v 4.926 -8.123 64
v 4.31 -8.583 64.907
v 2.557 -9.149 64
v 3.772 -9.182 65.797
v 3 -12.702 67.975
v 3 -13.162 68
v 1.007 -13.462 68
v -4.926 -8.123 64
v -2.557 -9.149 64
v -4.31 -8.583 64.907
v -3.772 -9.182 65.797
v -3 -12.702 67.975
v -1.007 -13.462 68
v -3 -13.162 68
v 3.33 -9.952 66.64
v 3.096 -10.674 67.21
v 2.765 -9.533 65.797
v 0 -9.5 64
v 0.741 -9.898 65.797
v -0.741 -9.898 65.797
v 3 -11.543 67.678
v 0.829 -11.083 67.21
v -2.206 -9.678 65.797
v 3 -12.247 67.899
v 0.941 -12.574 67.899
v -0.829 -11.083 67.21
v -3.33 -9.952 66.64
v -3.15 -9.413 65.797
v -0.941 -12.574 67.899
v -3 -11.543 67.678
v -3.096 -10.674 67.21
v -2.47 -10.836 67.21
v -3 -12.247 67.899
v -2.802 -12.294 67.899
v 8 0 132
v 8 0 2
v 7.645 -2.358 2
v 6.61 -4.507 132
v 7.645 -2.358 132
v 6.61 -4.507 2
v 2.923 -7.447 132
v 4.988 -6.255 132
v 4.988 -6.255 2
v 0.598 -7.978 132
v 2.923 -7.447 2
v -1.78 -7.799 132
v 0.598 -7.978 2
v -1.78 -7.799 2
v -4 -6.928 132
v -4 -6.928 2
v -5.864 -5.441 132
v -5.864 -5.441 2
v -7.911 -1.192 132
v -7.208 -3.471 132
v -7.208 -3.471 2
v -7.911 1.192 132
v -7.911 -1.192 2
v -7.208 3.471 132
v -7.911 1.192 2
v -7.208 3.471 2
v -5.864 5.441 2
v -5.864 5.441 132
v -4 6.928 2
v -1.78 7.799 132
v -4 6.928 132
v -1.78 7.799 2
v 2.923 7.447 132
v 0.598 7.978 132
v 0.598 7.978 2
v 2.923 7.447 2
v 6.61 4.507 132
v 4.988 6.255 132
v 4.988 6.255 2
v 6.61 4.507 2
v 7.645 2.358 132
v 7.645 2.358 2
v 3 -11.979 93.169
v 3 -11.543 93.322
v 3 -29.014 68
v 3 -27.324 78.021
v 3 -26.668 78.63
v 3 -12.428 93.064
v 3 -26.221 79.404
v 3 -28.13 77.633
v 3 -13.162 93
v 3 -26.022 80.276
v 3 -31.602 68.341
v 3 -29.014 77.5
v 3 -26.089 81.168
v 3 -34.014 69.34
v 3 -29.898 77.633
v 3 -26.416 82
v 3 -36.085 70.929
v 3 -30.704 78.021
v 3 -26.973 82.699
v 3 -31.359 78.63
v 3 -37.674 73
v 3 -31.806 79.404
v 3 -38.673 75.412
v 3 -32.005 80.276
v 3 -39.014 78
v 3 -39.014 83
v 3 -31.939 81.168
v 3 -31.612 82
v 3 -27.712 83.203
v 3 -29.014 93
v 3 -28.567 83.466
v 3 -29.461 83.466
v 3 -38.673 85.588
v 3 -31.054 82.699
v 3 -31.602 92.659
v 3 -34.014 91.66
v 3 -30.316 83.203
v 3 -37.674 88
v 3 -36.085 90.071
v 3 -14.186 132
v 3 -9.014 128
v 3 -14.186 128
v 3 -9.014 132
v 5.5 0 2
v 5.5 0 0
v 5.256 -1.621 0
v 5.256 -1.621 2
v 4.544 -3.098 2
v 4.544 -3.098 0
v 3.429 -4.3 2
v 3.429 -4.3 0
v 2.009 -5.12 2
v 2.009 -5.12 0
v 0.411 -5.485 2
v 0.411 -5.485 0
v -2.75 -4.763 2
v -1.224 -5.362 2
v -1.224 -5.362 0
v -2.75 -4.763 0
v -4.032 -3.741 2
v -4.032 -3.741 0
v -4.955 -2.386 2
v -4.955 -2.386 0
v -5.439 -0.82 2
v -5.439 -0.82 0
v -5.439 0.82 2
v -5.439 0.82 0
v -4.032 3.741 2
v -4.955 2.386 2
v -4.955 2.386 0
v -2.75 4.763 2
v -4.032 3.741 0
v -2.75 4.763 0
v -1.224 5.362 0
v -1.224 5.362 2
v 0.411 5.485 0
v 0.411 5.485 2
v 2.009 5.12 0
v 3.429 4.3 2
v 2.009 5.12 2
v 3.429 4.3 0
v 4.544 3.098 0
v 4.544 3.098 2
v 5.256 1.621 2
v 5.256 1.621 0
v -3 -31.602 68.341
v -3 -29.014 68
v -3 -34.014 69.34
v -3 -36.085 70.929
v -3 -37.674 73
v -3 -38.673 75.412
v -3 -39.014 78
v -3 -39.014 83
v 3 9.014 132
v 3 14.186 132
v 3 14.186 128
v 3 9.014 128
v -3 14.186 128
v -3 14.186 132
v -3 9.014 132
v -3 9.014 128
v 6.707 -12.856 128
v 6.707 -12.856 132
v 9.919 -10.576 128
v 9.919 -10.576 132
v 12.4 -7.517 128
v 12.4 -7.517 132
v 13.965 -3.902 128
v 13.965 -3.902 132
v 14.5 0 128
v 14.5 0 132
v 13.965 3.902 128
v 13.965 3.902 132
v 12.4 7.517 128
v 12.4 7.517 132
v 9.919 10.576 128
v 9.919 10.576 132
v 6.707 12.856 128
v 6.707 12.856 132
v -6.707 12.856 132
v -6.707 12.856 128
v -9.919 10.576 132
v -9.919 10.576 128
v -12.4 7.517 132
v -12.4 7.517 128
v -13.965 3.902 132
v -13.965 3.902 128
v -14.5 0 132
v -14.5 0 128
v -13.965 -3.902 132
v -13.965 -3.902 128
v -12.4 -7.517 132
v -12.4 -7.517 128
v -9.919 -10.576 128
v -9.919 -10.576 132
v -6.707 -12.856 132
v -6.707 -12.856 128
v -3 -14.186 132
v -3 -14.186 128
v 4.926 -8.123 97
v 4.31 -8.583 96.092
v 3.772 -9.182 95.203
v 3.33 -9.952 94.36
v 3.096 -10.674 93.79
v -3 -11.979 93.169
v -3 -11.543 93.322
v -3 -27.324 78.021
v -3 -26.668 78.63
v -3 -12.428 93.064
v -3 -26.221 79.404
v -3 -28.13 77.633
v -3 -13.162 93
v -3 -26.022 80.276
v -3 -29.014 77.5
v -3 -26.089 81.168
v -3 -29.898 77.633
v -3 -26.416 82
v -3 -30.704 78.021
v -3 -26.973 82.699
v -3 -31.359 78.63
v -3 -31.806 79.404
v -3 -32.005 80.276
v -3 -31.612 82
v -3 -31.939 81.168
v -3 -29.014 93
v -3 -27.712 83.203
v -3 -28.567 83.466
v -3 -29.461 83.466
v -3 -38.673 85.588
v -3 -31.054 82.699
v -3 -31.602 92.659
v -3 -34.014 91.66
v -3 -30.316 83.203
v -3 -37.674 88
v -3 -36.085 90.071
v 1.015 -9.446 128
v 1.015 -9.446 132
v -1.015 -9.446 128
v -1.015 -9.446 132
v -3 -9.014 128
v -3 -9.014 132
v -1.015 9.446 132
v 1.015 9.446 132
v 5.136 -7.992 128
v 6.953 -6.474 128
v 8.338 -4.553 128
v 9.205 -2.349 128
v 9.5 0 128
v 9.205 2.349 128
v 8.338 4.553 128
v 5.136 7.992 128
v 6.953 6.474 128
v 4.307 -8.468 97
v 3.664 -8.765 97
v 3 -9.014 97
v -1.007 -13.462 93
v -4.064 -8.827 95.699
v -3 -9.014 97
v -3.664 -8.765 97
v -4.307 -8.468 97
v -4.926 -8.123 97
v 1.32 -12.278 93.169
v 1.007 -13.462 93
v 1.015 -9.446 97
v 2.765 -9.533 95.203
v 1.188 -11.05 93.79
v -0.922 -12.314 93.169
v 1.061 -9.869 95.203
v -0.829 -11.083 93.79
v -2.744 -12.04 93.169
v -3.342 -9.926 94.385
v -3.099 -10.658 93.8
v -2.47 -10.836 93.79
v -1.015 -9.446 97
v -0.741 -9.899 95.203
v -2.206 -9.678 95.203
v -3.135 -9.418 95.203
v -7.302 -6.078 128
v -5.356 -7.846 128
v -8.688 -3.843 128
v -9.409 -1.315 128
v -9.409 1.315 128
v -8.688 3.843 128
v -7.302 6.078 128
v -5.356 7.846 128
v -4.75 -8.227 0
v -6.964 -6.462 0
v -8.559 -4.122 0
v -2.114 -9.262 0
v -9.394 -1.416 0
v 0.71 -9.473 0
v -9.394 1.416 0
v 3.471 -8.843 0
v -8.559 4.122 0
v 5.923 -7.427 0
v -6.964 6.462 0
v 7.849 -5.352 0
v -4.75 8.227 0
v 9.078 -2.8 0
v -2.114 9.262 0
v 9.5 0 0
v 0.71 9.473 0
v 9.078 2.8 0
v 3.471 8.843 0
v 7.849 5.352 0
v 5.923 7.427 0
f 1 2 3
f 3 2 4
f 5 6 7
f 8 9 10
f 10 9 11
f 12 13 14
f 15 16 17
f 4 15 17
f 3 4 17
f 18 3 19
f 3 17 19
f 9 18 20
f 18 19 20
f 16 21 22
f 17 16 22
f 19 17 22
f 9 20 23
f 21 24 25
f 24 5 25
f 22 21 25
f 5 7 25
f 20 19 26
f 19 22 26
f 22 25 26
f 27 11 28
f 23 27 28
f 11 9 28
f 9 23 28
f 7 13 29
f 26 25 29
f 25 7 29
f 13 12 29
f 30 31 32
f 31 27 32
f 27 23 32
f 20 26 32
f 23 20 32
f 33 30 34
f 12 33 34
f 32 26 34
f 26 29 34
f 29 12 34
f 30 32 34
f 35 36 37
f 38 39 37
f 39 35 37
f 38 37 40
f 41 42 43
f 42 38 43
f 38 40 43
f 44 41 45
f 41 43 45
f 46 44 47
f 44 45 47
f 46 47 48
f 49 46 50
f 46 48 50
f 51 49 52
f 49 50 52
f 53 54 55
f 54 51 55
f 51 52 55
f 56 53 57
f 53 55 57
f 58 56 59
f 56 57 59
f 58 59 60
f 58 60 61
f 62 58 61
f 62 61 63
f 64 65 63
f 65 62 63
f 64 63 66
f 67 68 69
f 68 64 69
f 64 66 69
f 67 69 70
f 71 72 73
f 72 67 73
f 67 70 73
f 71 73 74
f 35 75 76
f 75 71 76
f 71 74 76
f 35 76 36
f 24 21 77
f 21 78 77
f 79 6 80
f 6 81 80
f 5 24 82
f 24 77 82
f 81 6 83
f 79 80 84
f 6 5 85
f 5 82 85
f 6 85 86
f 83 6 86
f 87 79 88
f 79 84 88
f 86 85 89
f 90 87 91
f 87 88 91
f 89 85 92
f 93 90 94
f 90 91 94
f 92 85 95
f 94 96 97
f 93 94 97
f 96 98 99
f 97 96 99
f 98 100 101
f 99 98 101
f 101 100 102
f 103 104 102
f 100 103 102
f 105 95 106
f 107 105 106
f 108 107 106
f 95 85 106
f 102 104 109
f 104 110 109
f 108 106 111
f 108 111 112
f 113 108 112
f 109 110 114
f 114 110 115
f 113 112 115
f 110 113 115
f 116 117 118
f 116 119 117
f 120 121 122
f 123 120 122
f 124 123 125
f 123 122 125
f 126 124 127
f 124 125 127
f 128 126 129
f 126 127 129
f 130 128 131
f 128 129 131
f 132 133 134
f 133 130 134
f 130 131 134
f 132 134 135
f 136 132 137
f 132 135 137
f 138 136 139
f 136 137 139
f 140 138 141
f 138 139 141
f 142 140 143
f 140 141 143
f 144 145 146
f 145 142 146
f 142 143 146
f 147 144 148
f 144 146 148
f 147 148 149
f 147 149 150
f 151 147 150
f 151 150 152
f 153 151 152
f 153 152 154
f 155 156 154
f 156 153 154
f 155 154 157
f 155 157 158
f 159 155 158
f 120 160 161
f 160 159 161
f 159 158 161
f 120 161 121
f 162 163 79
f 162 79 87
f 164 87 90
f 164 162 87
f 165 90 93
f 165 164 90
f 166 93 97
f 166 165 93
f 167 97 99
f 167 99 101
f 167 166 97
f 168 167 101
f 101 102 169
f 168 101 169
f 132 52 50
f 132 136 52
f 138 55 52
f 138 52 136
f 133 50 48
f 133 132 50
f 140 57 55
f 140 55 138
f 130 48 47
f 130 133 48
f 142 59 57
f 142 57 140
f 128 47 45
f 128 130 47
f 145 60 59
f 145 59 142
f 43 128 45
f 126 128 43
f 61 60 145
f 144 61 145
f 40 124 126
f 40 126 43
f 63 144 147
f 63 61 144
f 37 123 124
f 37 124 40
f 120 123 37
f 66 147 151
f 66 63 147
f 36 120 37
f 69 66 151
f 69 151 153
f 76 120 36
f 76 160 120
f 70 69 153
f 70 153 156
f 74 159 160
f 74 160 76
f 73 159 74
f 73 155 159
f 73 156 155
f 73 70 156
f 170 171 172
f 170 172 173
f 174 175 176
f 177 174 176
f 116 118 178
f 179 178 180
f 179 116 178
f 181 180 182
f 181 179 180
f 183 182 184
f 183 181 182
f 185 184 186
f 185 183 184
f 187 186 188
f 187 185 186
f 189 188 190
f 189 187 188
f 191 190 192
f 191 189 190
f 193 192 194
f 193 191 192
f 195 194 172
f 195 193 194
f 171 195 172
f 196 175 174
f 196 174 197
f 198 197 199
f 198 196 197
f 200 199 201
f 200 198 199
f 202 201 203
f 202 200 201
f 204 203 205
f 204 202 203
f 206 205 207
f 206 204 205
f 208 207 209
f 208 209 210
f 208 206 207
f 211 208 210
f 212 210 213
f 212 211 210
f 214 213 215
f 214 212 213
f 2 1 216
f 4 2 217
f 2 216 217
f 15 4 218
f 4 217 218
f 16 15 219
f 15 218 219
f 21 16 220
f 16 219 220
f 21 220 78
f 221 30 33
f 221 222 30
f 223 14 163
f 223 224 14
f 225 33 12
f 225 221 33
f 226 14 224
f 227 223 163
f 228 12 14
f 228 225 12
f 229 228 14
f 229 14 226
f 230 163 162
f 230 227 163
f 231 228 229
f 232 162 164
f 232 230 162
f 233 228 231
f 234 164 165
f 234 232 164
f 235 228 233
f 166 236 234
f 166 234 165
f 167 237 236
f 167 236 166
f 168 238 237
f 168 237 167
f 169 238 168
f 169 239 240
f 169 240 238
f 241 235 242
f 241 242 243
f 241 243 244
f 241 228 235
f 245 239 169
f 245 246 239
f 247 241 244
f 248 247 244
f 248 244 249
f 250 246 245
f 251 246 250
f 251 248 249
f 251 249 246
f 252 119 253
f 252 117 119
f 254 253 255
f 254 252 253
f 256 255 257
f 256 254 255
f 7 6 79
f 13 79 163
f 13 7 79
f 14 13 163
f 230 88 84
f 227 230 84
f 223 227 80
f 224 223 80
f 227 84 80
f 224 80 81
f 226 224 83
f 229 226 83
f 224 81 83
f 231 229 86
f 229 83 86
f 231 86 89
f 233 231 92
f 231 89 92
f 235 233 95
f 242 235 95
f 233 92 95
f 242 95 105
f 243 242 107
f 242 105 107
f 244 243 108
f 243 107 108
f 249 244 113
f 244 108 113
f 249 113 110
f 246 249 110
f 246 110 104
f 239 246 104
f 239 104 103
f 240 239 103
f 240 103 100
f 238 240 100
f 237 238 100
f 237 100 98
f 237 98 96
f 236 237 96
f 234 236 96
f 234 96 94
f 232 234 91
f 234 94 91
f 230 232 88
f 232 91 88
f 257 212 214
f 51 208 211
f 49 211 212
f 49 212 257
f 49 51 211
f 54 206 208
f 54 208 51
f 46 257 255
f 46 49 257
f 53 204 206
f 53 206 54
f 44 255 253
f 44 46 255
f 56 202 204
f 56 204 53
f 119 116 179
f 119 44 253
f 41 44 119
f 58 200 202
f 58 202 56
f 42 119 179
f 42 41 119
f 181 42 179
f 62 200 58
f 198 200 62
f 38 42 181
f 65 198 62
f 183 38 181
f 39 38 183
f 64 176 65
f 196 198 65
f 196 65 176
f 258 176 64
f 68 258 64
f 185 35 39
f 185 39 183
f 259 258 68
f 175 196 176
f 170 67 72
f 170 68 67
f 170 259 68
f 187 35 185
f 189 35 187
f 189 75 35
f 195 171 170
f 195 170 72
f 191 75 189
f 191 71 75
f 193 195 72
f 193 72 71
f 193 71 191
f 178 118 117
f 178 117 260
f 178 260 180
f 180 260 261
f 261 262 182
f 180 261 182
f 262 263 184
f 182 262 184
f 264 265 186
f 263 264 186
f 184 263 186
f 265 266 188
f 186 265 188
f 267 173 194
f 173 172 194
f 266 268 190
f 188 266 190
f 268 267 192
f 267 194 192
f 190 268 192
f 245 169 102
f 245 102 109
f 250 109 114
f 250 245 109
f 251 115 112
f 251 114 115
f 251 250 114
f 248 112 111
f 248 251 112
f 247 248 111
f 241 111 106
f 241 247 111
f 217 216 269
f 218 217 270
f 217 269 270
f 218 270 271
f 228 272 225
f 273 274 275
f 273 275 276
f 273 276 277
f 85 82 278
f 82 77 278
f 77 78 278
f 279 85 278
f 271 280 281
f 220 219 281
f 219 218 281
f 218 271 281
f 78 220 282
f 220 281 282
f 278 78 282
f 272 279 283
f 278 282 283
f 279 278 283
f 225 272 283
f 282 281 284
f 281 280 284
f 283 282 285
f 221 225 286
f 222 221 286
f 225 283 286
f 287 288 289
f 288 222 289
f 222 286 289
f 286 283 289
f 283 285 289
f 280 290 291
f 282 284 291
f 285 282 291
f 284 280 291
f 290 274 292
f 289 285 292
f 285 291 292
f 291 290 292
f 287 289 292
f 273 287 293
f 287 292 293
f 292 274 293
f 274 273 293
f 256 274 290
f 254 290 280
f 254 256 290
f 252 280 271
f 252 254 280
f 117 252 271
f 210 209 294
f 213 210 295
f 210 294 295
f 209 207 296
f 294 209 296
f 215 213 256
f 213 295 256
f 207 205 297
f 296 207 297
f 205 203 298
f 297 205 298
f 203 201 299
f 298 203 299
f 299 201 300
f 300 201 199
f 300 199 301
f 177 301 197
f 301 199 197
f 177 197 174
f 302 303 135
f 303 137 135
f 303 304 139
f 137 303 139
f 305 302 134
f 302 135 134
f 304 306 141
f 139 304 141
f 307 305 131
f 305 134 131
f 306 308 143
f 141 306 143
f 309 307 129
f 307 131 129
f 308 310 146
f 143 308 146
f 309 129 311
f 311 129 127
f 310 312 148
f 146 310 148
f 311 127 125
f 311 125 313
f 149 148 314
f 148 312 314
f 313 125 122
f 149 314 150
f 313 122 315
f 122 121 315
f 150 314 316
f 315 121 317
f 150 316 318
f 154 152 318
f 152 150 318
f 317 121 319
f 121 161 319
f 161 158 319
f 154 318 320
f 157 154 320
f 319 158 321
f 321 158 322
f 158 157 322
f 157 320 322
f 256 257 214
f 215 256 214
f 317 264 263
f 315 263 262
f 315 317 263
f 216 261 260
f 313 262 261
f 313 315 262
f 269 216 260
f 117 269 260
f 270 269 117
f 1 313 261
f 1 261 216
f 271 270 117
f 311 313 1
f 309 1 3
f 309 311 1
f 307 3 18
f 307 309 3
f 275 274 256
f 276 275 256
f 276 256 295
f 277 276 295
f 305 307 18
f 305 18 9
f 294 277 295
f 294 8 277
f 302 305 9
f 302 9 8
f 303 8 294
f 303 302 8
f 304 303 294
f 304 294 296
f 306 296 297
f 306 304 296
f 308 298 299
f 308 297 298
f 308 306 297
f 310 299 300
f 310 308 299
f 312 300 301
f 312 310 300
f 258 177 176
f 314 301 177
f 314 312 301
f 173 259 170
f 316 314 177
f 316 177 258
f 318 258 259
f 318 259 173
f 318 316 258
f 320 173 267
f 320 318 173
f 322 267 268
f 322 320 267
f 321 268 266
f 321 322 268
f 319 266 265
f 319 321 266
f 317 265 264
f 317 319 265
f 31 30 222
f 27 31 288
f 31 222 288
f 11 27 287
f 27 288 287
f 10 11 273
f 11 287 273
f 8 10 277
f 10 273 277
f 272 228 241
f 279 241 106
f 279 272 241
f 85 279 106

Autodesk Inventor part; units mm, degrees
ref_plane "YZ Plane" through (0, 0, 0) normal (1, 0, 0) x (0, 1, 0)
ref_plane "XZ Plane" through (0, 0, 0) normal (0, 1, 0) x (-1, 0, 0)
ref_plane "XY Plane" through (0, 0, 0) normal (0, 0, 1) x (1, 0, 0)
sketch "Boceto2" plane through (0, 0, 0) normal (0, 0, 1) x (1, 0, 0)
  circle A0 centre (0, 0) radius 9.5
  circle A1 centre (0, 0) radius 5.5
extrude "Extrusión1" add sketch "Boceto2" along normal blind 2
sketch "Boceto3" plane through (0, 0, 2) normal (0, 0, 1) x (1, 0, 0)
  circle A0 centre (0, 0) radius 9.5
  circle A1 centre (0, 0) radius 8
  dimension "d5" = 16
extrude "Extrusión2" add sketch "Boceto3" along normal blind 130
sketch "Boceto4" plane through (0, 0, 132) normal (0, 0, 1) x (1, 0, 0)
  circle A0 centre (0, 0) radius 9.5
  circle A1 centre (0, 0) radius 8
  circle A2 centre (0, 0) radius 14.5
  line L0 (3, 14.186261) -> (3, -14.186261)
  line L1 (-3, 14.186261) -> (-3, -14.186261)
  point P0 (3, 0)
  point P1 (-3, 0)
  point P2 (-3, 9.013878)
  point P3 (-3, -9.013878)
  point P4 (3, -9.013878)
  point P5 (3, 9.013878)
  dimension "d36" = 19
  dimension "d37" = 5
  dimension "d38" = 3
  dimension "d39" = 3
extrude "Extrusión3" add sketch "Boceto4" against normal blind 4 contours A0 L0 A2 | A0 L1 A2
sketch "Boceto5" plane through (0, 0, 128) normal (0, 0, -1) x (-1, 0, 0)
  line L0 (9.380832, 1.5) -> (10.897247, 1.5)
  line L1 (-9.380832, 1.5) -> (-10.897247, 1.5)
  line L2 (-9.380832, -1.5) -> (-10.897247, -1.5)
  line L3 (9.380832, -1.5) -> (10.897247, -1.5)
  arc A0 (-9.380832, 1.5) -> (-9.380832, -1.5) centre (0, 0) ccw
  arc A1 (9.380832, -1.5) -> (9.380832, 1.5) centre (0, 0) ccw
  line L4 (-10.897247, 1.5) -> (-12.409674, 1.5)
  line L5 (-10.897247, -1.5) -> (-12.409674, -1.5)
  line L6 (10.897247, 1.5) -> (12.409674, 1.5)
  line L7 (10.897247, -1.5) -> (12.409674, -1.5)
  arc A2 (-12.409674, 1.5) -> (-12.409674, -1.5) centre (0, 0) ccw
  arc A3 (12.409674, -1.5) -> (12.409674, 1.5) centre (0, 0) ccw
extrude "Extrusión4" [suppressed]
sketch "Boceto6" plane through (0, 0, 128) normal (0, 0, -1) x (-1, 0, 0)
  arc A0 (-3, -9.013878) -> (3, -9.013878) centre (0, 0) ccw
  line L0 (-2.5, -20.682789) -> (-2.5, -15.634719)
  line L1 (-3, -9.013878) -> (-3, -39.013878)
  line L2 (3, -9.013878) -> (3, -39.013878)
  line L3 (-3, -39.013878) -> (3, -39.013878)
  point P0 (-1.5, -10.897247)
  point P1 (-1.5, -9.380832)
extrude "Extrusión5" add sketch "Boceto6" along normal blind 60
sketch "Boceto7" plane through (0, 0, 128) normal (0, 0, 1) x (1, 0, 0)
  line L0 (-3, -39.013878) -> (-3, -9.013878)
  line L1 (-3, -9.013878) -> (-3, -39.013878)
  line L2 (3, -39.013878) -> (-3, -39.013878)
  line L3 (-3, -39.013878) -> (3, -39.013878)
  arc A0 (-3, -9.013878) -> (3, -9.013878) centre (0, 0) ccw
  line L4 (3, -39.013878) -> (3, -9.013878)
  circle A1 centre (0, 0) radius 9.5
extrude "Extrusión6" cut sketch "Boceto7" against normal blind 35 contours L0 A0 L4 L2
fillet "Empalme1" radius 10 2 edges at (0, -39.0139, 93) (0, -39.0139, 68)
fillet "Empalme2" radius 4 4 edges at (0, -9.5, 93) (3, -9.0139, 80.5) (-3, -9.0139, 80.5) (0, -9.5, 68)
sketch "Boceto8" plane through (3, -39.013878, 83) normal (1, 0, 0) x (0, 0, -1)
  arc A0 (-10, 10) -> (0, 0) centre (0, 10) ccw projected
  circle A1 centre (2.5, 10) radius 3
  point P0 (83, 39.013878)
  point P1 (15, 10)
extrude "Extrusión7" cut sketch "Boceto8" against normal blind 6
properties part number "Tubo"
